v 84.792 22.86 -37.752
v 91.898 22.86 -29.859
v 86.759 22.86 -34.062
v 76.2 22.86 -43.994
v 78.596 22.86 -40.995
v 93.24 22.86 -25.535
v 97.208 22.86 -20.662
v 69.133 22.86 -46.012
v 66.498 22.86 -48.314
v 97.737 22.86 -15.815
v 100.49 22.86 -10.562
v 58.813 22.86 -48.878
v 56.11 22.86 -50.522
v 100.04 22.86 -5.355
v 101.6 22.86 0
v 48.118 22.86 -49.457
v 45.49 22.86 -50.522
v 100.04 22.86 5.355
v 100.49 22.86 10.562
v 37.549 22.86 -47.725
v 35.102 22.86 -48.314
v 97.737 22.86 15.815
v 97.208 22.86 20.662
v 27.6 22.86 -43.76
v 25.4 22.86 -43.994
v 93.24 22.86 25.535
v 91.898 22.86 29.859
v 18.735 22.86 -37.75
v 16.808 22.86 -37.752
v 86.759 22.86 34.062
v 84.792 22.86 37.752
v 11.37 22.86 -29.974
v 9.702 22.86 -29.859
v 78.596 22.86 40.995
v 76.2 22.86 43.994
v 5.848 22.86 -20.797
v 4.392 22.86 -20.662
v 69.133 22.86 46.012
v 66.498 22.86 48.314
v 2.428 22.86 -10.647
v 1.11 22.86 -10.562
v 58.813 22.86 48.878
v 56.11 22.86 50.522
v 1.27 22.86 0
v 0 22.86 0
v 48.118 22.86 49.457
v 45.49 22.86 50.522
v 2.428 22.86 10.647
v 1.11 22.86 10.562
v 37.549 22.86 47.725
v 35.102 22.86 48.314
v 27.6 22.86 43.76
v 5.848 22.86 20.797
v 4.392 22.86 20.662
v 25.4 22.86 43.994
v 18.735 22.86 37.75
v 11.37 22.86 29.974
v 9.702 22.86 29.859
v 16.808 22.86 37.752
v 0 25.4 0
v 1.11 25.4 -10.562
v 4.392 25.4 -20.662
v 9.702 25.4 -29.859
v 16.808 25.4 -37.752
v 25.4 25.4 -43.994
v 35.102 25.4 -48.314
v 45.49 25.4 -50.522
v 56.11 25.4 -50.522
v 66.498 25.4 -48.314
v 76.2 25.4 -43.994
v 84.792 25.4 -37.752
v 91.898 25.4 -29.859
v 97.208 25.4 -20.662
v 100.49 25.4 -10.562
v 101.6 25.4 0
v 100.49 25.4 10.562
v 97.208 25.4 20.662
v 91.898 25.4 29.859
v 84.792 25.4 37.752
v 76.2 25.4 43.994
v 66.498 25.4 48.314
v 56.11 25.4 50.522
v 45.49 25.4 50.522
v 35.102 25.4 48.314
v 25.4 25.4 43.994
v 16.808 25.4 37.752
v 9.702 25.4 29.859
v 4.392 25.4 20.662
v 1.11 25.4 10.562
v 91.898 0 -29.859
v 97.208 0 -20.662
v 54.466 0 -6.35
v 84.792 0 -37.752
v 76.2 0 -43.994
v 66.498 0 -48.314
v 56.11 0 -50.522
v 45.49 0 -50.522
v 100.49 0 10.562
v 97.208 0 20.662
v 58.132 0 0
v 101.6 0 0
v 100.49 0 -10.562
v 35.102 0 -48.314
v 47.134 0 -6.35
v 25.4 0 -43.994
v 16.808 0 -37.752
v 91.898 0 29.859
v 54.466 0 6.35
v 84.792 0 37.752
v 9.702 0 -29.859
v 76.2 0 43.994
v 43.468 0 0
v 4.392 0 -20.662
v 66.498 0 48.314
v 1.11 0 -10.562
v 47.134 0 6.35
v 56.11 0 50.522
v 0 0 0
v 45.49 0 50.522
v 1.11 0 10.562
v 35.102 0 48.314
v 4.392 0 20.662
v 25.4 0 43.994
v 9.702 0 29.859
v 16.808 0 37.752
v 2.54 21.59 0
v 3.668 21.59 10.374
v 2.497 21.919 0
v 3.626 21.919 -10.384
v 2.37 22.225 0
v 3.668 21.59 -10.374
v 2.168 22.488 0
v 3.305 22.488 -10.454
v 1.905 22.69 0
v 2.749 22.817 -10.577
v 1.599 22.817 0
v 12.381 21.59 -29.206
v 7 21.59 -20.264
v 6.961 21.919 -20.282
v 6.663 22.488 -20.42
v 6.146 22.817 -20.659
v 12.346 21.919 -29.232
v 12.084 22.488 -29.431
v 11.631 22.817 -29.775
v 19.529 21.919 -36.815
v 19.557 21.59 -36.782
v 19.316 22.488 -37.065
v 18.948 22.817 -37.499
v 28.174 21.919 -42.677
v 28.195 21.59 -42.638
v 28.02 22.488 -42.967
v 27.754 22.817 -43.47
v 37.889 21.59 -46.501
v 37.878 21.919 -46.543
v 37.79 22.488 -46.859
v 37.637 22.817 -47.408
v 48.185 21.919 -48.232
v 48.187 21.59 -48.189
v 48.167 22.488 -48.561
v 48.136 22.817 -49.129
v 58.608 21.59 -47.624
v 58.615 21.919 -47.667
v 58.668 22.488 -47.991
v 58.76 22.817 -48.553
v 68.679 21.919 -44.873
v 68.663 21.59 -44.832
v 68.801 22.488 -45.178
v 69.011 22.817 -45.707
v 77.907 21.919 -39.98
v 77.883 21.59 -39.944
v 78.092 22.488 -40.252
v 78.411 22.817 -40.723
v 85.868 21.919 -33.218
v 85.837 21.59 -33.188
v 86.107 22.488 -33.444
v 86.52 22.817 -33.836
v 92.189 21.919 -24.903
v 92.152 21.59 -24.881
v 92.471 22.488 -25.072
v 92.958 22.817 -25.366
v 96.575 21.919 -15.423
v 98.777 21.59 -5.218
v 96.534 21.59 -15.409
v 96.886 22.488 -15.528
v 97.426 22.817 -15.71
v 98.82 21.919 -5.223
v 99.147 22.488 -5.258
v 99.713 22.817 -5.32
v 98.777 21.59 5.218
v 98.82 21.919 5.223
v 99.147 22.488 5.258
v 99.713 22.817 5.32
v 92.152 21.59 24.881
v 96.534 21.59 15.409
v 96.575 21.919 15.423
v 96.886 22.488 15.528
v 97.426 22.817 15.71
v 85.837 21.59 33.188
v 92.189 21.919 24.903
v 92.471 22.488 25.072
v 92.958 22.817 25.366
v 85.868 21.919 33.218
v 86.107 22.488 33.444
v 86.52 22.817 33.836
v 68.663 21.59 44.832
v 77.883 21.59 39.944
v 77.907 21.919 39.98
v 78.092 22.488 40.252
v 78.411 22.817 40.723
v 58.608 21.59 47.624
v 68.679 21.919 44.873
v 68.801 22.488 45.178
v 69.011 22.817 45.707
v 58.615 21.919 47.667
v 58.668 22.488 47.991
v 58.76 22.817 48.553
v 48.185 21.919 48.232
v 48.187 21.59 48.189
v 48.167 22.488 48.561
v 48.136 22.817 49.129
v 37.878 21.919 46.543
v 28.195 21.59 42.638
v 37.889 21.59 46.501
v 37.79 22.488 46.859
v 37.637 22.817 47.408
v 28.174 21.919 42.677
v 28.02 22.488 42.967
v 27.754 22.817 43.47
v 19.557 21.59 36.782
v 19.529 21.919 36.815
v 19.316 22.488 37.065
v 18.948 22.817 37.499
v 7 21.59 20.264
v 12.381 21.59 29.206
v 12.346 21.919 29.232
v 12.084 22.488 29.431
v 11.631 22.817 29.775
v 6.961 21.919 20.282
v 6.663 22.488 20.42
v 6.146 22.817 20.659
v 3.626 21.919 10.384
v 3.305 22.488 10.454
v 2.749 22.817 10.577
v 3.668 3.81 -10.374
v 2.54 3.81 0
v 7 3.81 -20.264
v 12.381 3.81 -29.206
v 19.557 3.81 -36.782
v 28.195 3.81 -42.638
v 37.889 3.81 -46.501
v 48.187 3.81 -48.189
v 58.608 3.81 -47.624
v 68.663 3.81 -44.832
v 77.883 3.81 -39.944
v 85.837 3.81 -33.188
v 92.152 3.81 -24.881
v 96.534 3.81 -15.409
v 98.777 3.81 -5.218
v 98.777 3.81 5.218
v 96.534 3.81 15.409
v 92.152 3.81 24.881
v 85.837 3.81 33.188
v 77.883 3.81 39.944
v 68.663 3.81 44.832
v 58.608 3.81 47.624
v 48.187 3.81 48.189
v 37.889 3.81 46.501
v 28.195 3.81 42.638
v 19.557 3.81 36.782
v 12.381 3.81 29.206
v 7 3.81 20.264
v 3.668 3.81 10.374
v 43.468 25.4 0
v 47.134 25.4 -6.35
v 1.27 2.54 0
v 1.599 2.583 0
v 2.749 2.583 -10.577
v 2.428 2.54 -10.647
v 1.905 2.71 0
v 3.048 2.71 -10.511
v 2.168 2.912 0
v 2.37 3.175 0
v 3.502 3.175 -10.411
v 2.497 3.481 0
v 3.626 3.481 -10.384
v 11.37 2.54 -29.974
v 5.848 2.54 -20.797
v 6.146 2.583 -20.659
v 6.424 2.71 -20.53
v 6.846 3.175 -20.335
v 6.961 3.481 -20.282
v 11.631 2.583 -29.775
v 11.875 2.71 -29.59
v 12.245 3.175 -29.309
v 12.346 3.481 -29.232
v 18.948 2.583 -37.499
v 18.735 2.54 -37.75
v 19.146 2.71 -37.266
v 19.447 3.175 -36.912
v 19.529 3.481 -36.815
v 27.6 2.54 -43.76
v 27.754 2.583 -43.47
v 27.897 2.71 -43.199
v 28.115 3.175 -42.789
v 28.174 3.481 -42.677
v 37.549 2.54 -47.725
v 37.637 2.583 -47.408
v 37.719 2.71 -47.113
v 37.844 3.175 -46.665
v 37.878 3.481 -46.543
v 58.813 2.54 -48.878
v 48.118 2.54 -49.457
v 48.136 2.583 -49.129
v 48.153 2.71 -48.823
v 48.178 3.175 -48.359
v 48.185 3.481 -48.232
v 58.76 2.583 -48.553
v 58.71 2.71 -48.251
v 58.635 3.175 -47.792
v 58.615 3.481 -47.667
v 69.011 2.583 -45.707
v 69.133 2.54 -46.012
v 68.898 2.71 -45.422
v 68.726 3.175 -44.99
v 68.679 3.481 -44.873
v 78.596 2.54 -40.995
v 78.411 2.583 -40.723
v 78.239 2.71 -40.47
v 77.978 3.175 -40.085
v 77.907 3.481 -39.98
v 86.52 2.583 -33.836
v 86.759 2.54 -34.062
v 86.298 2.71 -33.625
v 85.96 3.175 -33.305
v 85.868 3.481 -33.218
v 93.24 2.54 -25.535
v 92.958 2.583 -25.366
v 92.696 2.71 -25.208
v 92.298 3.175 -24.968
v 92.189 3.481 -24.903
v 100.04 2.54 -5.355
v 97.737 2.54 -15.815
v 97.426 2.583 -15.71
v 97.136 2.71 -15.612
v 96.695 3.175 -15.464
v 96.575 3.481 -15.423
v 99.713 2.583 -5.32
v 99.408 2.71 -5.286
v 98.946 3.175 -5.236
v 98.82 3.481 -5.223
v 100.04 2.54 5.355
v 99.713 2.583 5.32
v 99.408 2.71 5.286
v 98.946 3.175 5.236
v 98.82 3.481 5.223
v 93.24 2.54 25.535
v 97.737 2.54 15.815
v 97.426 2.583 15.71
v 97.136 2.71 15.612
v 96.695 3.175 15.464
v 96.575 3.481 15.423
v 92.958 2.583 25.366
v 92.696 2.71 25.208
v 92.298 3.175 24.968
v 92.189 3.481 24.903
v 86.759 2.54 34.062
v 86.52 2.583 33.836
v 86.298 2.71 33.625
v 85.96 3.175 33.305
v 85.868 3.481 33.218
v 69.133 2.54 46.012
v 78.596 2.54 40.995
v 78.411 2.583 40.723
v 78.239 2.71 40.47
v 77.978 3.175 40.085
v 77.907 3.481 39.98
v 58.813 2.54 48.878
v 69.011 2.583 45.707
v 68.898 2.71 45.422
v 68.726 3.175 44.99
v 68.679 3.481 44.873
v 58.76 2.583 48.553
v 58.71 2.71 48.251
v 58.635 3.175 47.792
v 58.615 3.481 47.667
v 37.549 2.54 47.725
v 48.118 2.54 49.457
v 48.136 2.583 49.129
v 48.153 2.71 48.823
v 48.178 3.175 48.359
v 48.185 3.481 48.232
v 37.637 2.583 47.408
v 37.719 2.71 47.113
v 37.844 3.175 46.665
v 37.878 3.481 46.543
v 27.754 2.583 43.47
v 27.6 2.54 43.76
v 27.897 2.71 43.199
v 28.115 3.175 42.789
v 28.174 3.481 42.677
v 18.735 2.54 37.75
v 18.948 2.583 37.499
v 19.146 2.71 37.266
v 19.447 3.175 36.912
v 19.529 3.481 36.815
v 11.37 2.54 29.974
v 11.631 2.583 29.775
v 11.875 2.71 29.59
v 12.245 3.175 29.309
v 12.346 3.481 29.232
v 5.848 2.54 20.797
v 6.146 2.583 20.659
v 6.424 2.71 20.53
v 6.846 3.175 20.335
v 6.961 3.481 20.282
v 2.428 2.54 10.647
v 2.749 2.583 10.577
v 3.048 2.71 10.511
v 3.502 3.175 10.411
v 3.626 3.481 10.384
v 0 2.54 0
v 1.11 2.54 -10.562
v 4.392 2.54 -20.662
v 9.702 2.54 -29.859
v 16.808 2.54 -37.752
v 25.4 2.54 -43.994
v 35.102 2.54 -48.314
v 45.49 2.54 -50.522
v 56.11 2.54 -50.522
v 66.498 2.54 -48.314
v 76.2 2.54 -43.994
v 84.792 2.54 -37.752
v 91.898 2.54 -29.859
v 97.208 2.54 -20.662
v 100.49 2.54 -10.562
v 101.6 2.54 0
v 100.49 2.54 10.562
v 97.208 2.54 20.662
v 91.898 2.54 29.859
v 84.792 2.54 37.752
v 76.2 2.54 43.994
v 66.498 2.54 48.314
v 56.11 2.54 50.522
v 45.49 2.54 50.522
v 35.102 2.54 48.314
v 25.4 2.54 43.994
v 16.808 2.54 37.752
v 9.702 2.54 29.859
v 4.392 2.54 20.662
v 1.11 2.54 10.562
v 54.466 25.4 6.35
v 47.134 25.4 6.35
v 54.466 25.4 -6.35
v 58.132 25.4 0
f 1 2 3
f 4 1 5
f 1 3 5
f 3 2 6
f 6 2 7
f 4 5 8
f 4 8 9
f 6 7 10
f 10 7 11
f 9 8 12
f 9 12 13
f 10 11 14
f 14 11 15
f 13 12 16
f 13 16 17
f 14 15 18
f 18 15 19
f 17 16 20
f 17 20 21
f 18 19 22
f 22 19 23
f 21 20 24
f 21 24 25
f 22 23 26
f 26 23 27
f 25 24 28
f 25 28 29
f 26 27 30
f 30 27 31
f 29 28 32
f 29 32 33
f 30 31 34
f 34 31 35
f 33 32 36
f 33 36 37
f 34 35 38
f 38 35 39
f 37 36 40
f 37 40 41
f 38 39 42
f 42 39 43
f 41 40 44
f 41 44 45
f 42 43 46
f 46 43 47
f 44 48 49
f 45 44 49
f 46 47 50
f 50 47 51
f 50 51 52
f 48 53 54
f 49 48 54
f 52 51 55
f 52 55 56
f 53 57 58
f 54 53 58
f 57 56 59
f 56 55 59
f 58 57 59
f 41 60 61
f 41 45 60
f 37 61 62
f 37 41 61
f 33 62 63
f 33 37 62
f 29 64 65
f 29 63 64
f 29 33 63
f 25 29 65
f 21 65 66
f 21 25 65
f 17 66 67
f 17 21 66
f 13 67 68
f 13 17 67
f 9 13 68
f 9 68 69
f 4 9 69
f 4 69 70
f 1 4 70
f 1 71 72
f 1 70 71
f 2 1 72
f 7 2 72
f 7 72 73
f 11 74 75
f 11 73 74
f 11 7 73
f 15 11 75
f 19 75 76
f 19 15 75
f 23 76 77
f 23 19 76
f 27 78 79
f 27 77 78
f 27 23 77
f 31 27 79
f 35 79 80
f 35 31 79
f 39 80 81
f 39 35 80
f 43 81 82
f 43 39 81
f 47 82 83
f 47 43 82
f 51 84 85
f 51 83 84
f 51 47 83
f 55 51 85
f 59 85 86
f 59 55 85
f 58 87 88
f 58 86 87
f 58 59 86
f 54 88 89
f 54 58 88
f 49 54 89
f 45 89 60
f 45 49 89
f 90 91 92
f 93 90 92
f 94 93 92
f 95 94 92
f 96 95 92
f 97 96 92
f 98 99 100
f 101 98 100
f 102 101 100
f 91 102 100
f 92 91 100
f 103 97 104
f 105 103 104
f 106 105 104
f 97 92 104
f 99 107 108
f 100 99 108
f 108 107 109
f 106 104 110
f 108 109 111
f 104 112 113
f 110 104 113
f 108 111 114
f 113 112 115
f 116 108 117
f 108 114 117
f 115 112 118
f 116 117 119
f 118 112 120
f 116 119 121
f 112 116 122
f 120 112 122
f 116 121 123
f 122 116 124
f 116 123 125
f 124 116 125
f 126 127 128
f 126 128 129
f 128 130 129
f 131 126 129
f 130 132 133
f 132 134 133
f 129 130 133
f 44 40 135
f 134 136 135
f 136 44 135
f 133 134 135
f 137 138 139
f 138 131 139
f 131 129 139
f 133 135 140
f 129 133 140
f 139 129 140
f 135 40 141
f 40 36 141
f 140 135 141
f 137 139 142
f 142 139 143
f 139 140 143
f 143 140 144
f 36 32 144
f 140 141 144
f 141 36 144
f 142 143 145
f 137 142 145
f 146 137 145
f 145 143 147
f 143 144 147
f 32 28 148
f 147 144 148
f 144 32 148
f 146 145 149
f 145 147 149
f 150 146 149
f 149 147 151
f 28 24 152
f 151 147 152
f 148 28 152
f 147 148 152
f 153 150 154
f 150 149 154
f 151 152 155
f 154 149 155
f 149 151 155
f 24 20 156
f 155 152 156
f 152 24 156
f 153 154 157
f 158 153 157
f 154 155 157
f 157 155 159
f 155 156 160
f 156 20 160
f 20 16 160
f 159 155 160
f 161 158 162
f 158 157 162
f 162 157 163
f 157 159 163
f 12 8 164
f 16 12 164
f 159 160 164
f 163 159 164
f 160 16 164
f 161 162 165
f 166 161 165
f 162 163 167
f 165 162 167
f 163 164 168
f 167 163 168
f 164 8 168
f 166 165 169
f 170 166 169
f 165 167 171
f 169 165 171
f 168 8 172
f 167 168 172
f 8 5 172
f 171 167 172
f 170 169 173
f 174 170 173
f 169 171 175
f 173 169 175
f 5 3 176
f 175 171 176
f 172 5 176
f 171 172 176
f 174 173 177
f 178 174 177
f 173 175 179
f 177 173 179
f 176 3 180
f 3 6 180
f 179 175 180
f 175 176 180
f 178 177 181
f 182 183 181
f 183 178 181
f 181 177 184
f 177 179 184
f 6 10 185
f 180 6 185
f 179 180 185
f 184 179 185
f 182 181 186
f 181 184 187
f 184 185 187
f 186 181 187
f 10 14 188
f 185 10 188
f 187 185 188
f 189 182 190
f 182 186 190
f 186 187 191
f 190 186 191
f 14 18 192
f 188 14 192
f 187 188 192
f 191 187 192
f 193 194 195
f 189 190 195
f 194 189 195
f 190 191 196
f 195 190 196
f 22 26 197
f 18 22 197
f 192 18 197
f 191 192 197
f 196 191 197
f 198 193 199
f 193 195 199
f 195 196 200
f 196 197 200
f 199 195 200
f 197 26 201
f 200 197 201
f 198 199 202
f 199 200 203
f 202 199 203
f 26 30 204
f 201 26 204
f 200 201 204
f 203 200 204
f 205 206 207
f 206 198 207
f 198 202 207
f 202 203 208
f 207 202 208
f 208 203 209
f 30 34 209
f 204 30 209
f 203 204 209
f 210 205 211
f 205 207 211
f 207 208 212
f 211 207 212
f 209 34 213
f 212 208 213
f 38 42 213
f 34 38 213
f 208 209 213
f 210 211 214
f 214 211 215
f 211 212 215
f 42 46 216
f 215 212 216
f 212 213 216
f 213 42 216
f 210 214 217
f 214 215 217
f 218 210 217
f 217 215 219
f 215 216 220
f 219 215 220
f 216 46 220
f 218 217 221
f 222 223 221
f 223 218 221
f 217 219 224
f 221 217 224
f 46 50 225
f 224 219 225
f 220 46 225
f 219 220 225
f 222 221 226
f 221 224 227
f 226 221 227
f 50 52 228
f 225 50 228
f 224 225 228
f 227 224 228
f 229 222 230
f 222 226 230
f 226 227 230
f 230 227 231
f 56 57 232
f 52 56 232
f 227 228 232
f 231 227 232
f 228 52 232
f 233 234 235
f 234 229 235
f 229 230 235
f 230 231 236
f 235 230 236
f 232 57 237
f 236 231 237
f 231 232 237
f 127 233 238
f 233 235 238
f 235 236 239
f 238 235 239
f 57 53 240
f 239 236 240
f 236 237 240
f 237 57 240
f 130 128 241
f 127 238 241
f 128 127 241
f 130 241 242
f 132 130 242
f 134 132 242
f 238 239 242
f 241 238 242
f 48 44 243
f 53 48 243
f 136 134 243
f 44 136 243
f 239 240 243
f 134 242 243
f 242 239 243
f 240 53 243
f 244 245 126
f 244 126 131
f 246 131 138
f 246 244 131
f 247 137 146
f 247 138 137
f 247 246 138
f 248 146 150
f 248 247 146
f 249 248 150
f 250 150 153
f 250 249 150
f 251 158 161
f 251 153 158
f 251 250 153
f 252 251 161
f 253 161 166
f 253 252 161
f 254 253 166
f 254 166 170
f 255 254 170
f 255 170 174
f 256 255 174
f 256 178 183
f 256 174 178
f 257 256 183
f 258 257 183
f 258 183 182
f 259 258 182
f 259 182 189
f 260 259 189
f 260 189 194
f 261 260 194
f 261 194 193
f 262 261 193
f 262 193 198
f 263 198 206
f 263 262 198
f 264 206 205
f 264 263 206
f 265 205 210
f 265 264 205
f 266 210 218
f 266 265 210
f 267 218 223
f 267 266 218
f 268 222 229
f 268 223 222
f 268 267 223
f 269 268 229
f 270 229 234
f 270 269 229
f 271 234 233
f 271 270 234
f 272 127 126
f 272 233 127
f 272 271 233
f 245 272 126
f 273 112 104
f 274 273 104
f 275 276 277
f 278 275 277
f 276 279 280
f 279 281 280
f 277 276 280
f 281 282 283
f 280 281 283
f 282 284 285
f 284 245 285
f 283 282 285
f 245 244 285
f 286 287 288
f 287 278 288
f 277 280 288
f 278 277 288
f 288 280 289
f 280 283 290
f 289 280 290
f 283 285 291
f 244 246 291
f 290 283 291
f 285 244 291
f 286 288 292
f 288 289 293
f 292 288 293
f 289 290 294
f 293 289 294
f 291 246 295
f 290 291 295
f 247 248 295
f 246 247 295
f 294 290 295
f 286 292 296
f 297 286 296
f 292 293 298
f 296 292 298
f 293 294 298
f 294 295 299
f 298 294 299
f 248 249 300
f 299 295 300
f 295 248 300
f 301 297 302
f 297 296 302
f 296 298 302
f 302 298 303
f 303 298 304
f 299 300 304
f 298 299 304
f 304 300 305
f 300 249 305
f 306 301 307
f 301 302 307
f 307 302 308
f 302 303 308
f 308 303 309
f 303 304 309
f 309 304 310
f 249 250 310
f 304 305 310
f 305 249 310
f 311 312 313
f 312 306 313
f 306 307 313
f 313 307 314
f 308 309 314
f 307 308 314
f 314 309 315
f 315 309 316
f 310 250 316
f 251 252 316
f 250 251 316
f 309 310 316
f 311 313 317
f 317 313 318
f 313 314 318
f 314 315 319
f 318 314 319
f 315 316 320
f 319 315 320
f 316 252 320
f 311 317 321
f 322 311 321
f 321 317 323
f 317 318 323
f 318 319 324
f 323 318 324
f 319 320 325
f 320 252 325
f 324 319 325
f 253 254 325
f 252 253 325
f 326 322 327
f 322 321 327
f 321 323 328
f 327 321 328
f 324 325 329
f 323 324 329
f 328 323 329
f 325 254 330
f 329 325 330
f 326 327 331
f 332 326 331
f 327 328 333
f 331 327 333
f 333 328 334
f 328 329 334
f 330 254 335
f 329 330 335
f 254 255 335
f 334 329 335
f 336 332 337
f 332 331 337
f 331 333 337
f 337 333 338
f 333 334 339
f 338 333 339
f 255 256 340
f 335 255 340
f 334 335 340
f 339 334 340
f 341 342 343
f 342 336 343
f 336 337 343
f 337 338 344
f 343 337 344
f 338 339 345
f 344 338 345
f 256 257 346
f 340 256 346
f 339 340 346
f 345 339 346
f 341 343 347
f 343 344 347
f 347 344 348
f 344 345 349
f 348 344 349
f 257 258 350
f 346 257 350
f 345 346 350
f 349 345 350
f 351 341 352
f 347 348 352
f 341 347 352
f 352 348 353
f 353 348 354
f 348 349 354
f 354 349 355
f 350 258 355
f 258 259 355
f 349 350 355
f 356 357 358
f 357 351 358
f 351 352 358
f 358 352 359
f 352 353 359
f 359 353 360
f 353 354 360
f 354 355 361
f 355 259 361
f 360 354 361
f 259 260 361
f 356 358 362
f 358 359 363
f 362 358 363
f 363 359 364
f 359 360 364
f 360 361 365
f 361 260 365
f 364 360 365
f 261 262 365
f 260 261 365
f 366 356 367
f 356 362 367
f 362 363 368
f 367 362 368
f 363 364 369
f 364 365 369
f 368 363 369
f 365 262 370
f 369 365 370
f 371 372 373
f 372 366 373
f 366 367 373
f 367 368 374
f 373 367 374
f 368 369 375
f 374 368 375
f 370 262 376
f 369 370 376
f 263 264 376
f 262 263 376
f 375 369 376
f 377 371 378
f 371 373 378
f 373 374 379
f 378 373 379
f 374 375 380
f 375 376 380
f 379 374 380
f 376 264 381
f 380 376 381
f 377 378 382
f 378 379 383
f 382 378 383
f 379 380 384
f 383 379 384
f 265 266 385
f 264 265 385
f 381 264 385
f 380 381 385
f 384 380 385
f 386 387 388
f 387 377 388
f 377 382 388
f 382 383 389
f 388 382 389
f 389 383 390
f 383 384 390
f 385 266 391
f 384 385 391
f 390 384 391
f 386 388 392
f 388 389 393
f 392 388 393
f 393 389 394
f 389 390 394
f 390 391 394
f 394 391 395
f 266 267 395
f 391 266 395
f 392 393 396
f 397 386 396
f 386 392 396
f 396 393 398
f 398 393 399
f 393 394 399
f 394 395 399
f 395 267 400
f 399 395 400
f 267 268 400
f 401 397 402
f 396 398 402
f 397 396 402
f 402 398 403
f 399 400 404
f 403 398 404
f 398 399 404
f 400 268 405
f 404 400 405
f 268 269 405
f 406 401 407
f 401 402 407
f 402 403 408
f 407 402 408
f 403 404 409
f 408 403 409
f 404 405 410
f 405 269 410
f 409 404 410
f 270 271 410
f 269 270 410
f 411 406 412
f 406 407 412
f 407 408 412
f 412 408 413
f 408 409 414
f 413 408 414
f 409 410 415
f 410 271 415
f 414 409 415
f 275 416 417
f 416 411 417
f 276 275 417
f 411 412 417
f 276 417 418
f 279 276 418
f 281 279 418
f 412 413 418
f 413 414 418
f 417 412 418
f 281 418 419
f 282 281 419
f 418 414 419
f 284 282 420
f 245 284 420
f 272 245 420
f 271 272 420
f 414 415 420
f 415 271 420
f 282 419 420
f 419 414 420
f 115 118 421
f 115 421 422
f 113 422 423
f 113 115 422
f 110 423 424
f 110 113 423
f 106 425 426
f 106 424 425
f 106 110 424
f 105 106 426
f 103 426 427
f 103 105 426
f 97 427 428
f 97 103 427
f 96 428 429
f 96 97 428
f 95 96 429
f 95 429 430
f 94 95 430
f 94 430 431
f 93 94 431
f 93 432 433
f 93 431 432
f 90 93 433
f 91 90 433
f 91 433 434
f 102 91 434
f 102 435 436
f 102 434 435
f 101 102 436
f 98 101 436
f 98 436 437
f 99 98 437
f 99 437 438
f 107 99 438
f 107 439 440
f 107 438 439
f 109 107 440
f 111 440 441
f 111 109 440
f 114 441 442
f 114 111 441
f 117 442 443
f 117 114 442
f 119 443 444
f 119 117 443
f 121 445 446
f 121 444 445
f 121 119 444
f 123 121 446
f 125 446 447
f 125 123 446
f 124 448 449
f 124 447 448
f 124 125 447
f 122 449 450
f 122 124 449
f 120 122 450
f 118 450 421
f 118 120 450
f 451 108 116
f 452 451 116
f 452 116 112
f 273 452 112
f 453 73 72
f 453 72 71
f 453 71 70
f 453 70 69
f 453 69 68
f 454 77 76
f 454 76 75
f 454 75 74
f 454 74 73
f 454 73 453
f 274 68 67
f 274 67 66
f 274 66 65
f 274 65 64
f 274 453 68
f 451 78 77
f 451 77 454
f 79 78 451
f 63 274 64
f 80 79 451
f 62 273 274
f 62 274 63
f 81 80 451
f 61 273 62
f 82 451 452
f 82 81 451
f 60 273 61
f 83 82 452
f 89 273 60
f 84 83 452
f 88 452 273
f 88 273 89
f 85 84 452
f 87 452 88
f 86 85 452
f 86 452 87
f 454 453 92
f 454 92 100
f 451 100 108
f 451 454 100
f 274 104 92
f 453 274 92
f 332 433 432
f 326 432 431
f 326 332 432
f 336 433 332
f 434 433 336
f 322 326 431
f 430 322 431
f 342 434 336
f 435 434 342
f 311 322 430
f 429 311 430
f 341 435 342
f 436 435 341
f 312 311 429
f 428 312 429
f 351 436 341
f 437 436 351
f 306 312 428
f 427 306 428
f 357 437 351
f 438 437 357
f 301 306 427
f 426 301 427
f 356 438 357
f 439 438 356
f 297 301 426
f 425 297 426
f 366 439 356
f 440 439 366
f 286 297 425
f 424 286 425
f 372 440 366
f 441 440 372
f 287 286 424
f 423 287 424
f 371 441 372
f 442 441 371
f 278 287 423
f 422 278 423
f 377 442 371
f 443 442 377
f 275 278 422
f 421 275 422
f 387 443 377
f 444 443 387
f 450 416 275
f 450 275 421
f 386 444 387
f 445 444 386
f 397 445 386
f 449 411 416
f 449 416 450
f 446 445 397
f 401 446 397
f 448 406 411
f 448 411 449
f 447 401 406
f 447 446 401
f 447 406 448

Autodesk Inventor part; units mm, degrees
ref_plane "YZ Plane" through (0, 0, 0) normal (1, 0, 0) x (0, 1, 0)
ref_plane "XZ Plane" through (0, 0, 0) normal (0, 1, 0) x (-1, 0, 0)
ref_plane "XY Plane" through (0, 0, 0) normal (0, 0, 1) x (1, 0, 0)
sketch "Sketch1" plane through (0, 0, 0) normal (0, 0, 1) x (1, 0, 0)
  line L0 (0, 0) -> (50.8, 0)
  line L1 (50.8, 0) -> (50.8, 25.4)
  line L2 (50.8, 25.4) -> (0, 25.4)
  line L3 (0, 25.4) -> (0, 0)
  line L4 (0, 22.86) -> (1.27, 22.86)
  line L5 (2.54, 21.59) -> (2.54, 3.81)
  line L6 (1.27, 2.54) -> (0, 2.54)
  arc A0 (2.54, 21.59) -> (1.27, 22.86) centre (1.27, 21.59) ccw
  arc A1 (1.27, 2.54) -> (2.54, 3.81) centre (1.27, 3.81) ccw
  point P0 (0.635, 22.86)
  point P1 (0.635, 2.54)
  point P2 (41.91, 0)
  point P3 (41.91, 25.4)
  dimension "d0" = 50.8
  dimension "d1" = 25.4
  dimension "d2" = 2.54
  dimension "d3" = 2.54
  dimension "d4" = 2.54
  dimension "d5" = 1.27
revolve "Revolution1" add sketch "Sketch1" angle 360 about axis through (50.8, 0, 0) along (0, 1, 0) contours L3 L6 A1 L5 A0 L4 L2 L1 L0
sketch "Sketch2" plane through (50.8, 25.4, 0) normal (0, 1, 0) x (1, 0, 0)
  circle A0 centre (0, 0) radius 50.8 projected
  point P0 (-50.8, 0)
sketch "Sketch3" plane through (50.8, 25.4, 0) normal (0, 1, 0) x (1, 0, 0)
  circle A0 centre (0, 0) radius 6.35
  circle A1 centre (0, 0) radius 50.8 projected
  line L0 (3.6662, 6.35) -> (7.3323, 0)
  line L1 (7.3323, 0) -> (3.6662, -6.35)
  line L2 (3.6662, -6.35) -> (-3.6662, -6.35)
  line L3 (-3.6662, -6.35) -> (-7.3323, 0)
  line L4 (-7.3323, 0) -> (-3.6662, 6.35)
  line L5 (-3.6662, 6.35) -> (3.6662, 6.35)
  point P0 (-50.8, 0)
  point P1 (0, 6.35)
  dimension "d9" = 12.7
extrude "Extrusion1" cut sketch "Sketch3" against normal blind 25.4 contours A0 | A0 L0 L1 | A0 L5 L0 | L1 L2 A0 | A0 L4 L5 | L2 L3 A0 | A0 L3 L4
properties part number "4-bar intake () pully"
